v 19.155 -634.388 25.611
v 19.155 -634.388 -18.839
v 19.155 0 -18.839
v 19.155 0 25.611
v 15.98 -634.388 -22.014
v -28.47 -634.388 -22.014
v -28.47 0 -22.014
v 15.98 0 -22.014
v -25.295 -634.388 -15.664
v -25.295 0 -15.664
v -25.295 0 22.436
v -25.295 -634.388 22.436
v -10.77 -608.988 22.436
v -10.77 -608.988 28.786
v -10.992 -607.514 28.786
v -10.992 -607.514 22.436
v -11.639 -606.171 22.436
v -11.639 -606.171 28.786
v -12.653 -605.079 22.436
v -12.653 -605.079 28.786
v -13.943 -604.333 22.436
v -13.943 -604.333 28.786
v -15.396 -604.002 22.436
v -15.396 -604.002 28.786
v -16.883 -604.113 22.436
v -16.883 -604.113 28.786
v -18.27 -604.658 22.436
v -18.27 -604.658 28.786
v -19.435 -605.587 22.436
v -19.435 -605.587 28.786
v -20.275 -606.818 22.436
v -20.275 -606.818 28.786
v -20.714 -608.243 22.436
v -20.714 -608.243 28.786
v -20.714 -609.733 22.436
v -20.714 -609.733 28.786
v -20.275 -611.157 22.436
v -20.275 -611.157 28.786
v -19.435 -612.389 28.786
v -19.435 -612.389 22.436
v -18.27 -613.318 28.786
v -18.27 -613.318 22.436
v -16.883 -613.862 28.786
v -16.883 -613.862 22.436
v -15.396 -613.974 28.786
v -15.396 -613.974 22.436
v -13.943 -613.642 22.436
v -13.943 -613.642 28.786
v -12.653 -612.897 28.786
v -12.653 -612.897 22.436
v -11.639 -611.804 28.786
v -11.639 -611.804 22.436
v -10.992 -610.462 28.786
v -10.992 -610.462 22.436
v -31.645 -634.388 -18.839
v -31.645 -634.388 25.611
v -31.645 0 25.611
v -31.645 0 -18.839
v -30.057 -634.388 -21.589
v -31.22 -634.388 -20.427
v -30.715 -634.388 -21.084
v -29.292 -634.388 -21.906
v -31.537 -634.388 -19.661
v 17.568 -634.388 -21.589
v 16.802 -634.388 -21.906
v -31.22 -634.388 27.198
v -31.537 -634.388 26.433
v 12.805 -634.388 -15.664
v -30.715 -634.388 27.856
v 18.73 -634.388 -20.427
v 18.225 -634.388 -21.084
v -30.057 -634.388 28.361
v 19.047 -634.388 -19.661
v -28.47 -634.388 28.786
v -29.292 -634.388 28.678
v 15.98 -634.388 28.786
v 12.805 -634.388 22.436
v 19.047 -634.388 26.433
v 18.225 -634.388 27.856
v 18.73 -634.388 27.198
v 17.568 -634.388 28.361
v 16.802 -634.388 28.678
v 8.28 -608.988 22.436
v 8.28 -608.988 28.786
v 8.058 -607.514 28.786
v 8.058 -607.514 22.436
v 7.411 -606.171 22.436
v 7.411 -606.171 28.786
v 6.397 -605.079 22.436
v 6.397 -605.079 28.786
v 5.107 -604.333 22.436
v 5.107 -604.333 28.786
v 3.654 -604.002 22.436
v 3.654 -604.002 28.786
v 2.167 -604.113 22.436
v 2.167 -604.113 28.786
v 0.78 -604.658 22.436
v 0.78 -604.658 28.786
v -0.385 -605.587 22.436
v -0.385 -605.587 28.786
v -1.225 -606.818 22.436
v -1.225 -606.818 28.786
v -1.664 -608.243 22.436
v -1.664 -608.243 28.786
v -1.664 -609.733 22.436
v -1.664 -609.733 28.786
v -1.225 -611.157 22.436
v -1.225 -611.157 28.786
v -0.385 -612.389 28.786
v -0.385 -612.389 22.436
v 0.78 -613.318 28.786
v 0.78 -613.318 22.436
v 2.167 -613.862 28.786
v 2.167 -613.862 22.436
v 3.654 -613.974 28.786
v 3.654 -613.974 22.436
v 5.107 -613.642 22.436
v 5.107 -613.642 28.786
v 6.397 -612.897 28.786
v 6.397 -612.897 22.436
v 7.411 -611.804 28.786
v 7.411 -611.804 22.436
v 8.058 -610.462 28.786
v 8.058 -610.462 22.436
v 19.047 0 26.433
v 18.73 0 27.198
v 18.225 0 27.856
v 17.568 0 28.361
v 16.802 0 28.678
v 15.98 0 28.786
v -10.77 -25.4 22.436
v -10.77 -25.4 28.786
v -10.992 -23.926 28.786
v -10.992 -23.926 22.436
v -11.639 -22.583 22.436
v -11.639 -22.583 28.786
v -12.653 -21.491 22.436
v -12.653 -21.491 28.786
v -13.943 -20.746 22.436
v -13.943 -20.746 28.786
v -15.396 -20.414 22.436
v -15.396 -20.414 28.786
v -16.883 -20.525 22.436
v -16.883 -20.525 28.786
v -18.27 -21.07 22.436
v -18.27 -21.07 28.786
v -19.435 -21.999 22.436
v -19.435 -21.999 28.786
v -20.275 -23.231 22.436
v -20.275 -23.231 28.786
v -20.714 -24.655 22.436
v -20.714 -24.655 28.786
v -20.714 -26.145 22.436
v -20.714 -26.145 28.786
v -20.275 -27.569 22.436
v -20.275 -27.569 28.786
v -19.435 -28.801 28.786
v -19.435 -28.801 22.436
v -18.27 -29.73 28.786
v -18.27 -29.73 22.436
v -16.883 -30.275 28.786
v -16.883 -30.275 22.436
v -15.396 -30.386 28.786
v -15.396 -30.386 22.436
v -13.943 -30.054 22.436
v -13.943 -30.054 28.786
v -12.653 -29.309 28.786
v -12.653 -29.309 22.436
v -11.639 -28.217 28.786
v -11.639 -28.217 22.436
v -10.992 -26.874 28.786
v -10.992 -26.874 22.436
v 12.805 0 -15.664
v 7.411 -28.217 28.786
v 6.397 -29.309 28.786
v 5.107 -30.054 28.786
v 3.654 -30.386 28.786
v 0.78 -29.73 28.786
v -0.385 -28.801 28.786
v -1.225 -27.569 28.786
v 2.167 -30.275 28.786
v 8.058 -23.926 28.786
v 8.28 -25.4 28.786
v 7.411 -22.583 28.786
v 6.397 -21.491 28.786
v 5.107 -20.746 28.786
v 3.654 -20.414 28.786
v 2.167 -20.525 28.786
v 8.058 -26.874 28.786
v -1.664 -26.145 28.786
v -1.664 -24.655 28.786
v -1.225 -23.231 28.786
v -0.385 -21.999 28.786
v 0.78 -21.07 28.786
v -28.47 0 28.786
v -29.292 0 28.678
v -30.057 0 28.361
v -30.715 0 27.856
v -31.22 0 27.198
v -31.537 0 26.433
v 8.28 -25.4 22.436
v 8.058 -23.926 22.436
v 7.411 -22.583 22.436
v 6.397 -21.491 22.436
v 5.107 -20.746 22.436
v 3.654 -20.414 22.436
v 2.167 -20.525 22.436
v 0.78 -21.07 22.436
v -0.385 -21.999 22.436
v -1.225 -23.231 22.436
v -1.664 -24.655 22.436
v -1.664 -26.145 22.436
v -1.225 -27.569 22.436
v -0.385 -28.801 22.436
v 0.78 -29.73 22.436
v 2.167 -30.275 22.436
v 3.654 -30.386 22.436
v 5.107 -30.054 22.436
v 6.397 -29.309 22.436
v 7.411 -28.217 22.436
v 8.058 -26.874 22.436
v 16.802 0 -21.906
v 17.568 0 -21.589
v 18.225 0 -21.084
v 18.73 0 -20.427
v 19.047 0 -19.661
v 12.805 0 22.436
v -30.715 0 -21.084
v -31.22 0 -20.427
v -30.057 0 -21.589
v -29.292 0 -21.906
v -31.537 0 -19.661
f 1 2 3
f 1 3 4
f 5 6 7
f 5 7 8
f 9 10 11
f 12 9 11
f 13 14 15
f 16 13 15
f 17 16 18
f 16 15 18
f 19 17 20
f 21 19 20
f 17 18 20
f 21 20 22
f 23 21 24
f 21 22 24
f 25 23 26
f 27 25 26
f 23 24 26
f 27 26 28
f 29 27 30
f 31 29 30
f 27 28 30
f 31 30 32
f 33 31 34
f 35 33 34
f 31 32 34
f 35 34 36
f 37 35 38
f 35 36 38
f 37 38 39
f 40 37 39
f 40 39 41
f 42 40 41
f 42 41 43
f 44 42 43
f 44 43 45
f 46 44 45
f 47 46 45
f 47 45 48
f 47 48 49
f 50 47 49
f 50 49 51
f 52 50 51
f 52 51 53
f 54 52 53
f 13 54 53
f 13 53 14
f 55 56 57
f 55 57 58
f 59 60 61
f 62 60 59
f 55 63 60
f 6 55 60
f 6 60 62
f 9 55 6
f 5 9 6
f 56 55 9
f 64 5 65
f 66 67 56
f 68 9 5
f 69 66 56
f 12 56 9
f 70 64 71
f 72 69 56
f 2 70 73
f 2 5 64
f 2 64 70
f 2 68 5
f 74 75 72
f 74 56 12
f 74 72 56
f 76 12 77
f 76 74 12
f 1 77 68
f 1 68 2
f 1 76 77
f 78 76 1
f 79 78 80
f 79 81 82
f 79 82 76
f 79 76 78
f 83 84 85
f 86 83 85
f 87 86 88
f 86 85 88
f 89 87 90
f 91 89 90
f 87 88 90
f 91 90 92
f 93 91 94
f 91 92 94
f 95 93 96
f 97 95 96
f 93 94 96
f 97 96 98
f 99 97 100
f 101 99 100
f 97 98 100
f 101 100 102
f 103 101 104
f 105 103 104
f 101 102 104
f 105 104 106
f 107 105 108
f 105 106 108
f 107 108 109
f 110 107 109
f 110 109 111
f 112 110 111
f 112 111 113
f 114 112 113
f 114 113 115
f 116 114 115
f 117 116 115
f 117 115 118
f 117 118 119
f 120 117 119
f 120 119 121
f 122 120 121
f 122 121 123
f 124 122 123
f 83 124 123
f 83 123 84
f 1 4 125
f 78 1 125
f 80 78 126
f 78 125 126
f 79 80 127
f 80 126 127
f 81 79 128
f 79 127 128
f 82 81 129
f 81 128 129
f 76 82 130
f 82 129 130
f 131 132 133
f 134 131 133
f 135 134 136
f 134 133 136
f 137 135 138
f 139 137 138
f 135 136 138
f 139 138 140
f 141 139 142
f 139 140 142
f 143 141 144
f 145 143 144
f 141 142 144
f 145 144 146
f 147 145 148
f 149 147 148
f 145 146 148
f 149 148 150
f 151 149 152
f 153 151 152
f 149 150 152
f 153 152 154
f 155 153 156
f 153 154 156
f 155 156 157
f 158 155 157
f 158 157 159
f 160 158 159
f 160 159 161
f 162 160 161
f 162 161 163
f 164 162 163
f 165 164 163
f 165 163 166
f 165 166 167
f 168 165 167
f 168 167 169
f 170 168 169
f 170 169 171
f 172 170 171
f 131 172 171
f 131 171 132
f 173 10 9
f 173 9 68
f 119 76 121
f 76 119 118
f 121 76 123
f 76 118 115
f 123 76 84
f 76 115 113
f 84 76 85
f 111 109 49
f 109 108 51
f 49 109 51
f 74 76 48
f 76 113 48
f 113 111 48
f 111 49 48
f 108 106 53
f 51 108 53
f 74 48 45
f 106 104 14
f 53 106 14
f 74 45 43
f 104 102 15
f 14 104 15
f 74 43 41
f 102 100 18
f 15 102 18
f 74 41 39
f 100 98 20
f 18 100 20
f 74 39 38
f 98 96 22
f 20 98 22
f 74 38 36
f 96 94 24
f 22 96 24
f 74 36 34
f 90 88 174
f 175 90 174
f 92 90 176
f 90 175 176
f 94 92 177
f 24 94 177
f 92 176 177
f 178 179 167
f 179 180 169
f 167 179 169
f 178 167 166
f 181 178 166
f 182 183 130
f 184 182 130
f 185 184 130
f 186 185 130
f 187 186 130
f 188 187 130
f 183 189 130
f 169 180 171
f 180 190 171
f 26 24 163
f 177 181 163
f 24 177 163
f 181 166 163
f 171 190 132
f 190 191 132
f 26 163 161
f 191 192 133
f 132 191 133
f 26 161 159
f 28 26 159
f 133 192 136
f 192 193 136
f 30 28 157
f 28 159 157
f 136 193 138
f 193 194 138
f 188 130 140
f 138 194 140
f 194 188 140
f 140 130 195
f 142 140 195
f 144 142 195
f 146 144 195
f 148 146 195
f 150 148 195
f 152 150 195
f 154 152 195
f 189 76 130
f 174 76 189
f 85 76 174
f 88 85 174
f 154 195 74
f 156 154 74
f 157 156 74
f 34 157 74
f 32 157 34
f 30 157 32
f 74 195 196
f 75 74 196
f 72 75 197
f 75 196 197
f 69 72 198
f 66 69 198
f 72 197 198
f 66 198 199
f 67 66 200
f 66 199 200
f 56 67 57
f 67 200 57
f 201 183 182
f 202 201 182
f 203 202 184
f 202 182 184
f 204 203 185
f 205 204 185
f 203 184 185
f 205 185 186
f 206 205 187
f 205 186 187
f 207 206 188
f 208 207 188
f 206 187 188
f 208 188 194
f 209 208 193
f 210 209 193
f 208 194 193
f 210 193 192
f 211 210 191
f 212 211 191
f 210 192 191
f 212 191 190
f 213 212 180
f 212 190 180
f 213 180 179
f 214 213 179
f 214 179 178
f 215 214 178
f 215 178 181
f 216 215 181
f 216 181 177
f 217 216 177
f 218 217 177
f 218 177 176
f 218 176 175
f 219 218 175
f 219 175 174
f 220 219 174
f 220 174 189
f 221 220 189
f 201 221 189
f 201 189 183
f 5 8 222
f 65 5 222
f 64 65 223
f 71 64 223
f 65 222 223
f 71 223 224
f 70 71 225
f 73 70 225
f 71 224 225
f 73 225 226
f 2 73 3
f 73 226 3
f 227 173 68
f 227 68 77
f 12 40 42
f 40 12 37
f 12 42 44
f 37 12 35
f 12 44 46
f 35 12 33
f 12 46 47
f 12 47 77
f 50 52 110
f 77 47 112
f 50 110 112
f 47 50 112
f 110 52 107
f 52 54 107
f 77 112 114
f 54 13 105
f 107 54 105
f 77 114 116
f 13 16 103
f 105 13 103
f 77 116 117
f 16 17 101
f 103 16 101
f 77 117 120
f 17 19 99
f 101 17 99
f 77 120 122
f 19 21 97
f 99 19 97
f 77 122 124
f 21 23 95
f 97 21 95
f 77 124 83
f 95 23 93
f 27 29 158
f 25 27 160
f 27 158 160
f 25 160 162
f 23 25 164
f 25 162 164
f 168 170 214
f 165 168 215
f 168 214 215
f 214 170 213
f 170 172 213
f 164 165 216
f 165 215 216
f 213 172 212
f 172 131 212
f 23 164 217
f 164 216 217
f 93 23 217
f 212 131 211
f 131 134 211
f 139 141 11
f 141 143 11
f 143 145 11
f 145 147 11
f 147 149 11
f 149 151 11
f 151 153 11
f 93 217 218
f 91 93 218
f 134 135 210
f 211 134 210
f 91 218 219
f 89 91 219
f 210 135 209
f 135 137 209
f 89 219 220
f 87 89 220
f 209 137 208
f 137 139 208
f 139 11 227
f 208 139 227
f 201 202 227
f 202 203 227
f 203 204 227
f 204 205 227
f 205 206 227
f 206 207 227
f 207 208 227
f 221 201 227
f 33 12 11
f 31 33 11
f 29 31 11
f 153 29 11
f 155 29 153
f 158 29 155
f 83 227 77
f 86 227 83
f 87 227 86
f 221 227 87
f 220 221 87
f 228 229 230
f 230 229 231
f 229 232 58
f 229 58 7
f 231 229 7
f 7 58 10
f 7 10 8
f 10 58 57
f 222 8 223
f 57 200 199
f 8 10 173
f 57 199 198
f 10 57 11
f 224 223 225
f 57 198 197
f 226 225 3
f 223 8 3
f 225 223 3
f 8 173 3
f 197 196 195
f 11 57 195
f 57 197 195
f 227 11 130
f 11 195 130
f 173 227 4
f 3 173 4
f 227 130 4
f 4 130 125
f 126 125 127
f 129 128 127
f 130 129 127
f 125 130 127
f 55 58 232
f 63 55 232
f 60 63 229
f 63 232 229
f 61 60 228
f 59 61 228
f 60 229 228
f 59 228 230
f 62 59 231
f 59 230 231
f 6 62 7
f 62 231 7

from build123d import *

# Parameters (mm, degrees)
F0_W     = 38.1
F0_H     = 38.1
F1_DEPTH = 634.38786
F2_R     = 5
F3_DEPTH = 25.4


with BuildPart() as f1:
    # F0 (on Front) → F1 (new body)
    with BuildSketch(Plane.XZ):
        with BuildLine():
            Line((15.980036, 28.785883), (-28.469964, 28.785883))
            ThreePointArc((-28.469964, 28.785883), (-30.715028, 27.855947), (-31.644964, 25.610883))
            Line((-31.644964, 25.610883), (-31.644964, -18.839117))
            ThreePointArc((-31.644964, -18.839117), (-30.715028, -21.084181), (-28.469964, -22.014117))
            Line((-28.469964, -22.014117), (15.980036, -22.014117))
            ThreePointArc((15.980036, -22.014117), (18.2251, -21.084181), (19.155036, -18.839117))
            Line((19.155036, -18.839117), (19.155036, 25.610883))
            ThreePointArc((19.155036, 25.610883), (18.2251, 27.855947), (15.980036, 28.785883))
        make_face()
        with Locations((-6.244964, 3.385883)):
            Rectangle(F0_W, F0_H, mode=Mode.SUBTRACT)
    extrude(amount=F1_DEPTH)

    # F2 (on face) → F3 (cut)
    with BuildSketch(Plane.XY.offset(28.785883)):
        with Locations((-15.769964, -25.4)):
            Circle(F2_R)
        with Locations((3.280036, -25.4)):
            Circle(F2_R)
        with Locations((-15.769964, -608.98786)):
            Circle(F2_R)
        with Locations((3.280036, -608.98786)):
            Circle(F2_R)
    extrude(amount=-F3_DEPTH, mode=Mode.SUBTRACT)


solid = f1.part
